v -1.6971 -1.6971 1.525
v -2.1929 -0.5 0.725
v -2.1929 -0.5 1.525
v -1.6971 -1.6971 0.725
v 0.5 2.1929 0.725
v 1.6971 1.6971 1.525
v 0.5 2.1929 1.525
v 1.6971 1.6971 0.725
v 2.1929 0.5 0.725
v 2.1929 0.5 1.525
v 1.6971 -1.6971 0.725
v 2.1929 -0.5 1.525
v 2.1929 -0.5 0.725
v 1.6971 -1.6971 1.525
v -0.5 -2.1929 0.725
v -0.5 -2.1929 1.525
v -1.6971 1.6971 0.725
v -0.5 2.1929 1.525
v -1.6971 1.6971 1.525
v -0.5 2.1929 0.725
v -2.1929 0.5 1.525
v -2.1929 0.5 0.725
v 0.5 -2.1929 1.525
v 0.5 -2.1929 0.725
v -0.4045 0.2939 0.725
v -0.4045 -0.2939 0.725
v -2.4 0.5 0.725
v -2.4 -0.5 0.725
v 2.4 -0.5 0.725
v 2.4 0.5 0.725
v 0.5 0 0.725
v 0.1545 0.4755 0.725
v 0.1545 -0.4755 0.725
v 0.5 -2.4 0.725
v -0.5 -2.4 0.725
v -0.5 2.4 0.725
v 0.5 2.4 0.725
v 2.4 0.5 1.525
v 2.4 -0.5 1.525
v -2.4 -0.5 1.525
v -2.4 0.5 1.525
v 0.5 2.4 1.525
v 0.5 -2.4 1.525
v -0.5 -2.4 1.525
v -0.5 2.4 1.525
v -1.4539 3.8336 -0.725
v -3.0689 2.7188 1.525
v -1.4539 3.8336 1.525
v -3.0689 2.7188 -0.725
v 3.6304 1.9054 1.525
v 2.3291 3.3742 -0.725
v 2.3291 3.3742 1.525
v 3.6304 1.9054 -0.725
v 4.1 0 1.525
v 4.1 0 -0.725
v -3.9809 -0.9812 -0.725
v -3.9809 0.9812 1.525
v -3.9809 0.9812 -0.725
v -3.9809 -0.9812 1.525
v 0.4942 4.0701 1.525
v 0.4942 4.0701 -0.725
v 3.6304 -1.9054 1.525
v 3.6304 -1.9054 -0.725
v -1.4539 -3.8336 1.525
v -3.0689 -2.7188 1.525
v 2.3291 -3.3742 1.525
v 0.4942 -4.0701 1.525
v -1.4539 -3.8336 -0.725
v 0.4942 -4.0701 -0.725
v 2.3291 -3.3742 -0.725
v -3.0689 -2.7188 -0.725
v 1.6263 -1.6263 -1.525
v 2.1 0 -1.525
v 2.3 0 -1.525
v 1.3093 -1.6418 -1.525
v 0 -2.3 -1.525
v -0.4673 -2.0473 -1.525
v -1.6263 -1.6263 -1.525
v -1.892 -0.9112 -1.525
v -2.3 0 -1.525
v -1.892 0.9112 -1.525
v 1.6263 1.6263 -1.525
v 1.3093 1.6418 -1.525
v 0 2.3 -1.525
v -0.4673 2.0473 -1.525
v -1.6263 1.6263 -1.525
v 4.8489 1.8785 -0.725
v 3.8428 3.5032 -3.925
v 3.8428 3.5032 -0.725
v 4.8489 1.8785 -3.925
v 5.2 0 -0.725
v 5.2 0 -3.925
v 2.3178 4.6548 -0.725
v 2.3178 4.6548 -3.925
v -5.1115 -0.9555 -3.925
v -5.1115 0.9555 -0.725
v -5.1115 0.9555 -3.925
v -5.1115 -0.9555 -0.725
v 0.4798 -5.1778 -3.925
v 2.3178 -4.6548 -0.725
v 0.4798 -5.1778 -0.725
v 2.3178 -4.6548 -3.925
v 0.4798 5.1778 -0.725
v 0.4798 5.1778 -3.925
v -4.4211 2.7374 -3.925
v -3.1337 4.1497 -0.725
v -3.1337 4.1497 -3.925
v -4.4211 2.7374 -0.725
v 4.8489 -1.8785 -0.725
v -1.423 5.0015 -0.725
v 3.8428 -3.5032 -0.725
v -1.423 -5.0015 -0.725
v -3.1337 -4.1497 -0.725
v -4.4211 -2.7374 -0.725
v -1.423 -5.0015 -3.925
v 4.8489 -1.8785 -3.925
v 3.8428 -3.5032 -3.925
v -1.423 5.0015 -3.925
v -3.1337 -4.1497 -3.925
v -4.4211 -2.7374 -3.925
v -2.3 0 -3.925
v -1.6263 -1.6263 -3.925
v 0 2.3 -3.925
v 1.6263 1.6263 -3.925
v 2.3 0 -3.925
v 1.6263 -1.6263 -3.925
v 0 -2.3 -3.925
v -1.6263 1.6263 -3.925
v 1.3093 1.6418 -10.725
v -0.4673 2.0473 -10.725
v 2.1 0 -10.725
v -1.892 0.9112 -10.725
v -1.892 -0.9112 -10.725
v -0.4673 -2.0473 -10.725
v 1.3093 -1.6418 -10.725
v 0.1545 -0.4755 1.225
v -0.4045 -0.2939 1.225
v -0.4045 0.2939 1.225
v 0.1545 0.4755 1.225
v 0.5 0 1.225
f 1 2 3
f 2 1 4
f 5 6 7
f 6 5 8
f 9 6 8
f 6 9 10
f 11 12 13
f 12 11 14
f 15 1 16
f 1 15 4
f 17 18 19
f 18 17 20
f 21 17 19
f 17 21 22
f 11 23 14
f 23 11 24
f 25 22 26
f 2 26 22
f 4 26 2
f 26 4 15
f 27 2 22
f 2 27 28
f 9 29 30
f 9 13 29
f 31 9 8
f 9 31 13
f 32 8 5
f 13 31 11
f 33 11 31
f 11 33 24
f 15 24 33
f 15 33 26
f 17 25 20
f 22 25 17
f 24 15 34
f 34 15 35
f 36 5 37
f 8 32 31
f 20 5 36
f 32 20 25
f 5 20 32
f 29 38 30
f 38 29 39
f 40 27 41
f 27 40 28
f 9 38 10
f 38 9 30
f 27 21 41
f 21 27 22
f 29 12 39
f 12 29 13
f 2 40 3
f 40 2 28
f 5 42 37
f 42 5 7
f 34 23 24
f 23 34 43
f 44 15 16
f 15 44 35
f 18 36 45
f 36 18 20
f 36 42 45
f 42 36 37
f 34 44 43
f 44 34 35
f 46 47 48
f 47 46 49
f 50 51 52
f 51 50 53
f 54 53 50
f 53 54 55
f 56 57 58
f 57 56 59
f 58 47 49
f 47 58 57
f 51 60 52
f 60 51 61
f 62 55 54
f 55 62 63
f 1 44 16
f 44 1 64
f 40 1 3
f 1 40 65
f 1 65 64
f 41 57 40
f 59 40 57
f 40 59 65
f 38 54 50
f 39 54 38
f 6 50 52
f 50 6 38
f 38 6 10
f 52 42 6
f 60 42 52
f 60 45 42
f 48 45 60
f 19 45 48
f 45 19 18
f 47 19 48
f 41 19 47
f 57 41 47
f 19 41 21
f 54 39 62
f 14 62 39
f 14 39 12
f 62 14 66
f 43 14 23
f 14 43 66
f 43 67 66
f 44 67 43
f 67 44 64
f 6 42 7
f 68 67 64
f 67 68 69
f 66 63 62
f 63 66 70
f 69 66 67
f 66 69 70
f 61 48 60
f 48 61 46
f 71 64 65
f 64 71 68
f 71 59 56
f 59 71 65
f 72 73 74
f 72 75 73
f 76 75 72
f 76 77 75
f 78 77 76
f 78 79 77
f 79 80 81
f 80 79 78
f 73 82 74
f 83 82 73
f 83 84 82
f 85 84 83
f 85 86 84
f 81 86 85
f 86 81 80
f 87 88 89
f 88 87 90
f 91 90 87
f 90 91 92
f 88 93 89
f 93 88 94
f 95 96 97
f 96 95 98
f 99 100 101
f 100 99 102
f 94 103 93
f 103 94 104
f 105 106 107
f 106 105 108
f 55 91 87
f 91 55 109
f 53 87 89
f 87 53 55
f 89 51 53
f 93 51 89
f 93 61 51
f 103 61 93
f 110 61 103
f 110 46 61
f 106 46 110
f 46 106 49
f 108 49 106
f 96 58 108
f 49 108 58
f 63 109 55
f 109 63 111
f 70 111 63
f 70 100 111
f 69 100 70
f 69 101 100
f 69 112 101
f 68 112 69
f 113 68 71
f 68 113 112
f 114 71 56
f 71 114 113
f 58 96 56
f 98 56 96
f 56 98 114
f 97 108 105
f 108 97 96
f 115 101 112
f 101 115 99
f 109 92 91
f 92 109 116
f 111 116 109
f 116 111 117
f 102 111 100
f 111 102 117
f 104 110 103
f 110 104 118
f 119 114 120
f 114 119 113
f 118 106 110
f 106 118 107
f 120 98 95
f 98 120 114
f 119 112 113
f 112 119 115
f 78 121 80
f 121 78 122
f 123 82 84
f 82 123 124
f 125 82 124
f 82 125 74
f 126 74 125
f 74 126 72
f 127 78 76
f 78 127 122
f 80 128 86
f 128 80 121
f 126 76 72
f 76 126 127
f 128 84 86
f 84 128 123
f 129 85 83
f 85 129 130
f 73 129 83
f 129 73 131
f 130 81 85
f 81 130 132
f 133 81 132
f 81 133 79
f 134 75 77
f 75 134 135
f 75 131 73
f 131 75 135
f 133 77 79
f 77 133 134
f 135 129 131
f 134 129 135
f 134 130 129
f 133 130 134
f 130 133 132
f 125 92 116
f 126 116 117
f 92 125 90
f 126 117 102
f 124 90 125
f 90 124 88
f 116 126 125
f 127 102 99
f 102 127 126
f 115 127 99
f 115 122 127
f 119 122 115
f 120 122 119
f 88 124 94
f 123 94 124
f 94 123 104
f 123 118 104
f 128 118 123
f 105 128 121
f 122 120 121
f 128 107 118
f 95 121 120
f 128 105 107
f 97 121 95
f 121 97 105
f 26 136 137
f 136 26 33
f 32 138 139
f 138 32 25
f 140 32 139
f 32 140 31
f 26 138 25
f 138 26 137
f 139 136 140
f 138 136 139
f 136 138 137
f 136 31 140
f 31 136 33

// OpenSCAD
// Parameters
shank_diameter = 4.2; //[2.1:8.4:0.1]
shank_radius = 2.1; //[1.05:4.2:0.05]
length_under_head = 10; //[5:20:0.5]
head_diameter = 8.2; //[4.1:16.4:0.1]
head_radius = 4.1; //[2.05:8.2:0.05]
head_height = 3.05; //[1.5:6.1:0.05]
overlap = 0.8; //[0.2:2:0.1]
drive_recess_radius = 2.4; //[1.2:4.8:0.1]
drive_recess_depth = 1.6; //[0.8:3.2:0.1]
drive_slot_width = 1; //[0.5:2:0.1]
washer_outer_radius = 5.2; //[2.6:10.4:0.1]
washer_thickness = 1; //[0.5:2:0.1]
washer_inner_radius = 2.3; //[1.2:4.6:0.05]
pcb_spacer_height = 3; //[1.5:6:0.5]
buzzer_radius = 0.5; //[0.25:1:0.05]
buzzer_height = 0.5; //[0.25:1:0.05]

// PCB Spacer - complete geometry
module pcb_spacer() {
  color([0.85, 0.85, 0.8]) {
    difference() {
      cylinder(r=washer_outer_radius, h=pcb_spacer_height, center=true);
      translate([0, 0, 0])
        cylinder(r=washer_inner_radius, h=pcb_spacer_height + 2*overlap, center=true);
    }
  }
}

// Screw and Washer - complete geometry
module screw_and_washer() {
  color("DimGray") {
    union() {
      // Screw Shank
      translate([0, 0, -head_height/2 - length_under_head/2 + overlap])
        cylinder(r=shank_radius, h=length_under_head, center=true);
      
      // Pan Head with Drive Recess
      difference() {
        translate([0, 0, 0])
          cylinder(r=head_radius, h=head_height, center=true);
        union() {
          translate([0, 0, head_height/2 - drive_recess_depth/2 + overlap])
            cylinder(r=drive_recess_radius, h=drive_recess_depth, center=true);
          translate([0, 0, head_height/2 - drive_recess_depth/2 + overlap])
            cube([2*drive_recess_radius, drive_slot_width, drive_recess_depth], center=true);
          translate([0, 0, head_height/2 - drive_recess_depth/2 + overlap])
            cube([drive_slot_width, 2*drive_recess_radius, drive_recess_depth], center=true);
        }
      }
      
      // Washer Ring
      difference() {
        translate([0, 0, -head_height/2 - washer_thickness/2 + overlap])
          cylinder(r=washer_outer_radius, h=washer_thickness, center=true);
        translate([0, 0, -head_height/2 - washer_thickness/2 + overlap])
          cylinder(r=washer_inner_radius, h=washer_thickness + 2*overlap, center=true);
      }
    }
  }
}

// Buzzer - complete geometry
module buzzer() {
  color([0.72, 0.45, 0.2]) {
    translate([0, 0, head_height/2 + buzzer_height/2 - overlap])
      cylinder(r=buzzer_radius, h=buzzer_height, center=true);
  }
}

// Assembly
module assembly() {
  screw_and_washer();
  translate([0, 0, -head_height/2 - washer_thickness - pcb_spacer_height/2 + 2*overlap])
    pcb_spacer();
  buzzer();
}

assembly();
